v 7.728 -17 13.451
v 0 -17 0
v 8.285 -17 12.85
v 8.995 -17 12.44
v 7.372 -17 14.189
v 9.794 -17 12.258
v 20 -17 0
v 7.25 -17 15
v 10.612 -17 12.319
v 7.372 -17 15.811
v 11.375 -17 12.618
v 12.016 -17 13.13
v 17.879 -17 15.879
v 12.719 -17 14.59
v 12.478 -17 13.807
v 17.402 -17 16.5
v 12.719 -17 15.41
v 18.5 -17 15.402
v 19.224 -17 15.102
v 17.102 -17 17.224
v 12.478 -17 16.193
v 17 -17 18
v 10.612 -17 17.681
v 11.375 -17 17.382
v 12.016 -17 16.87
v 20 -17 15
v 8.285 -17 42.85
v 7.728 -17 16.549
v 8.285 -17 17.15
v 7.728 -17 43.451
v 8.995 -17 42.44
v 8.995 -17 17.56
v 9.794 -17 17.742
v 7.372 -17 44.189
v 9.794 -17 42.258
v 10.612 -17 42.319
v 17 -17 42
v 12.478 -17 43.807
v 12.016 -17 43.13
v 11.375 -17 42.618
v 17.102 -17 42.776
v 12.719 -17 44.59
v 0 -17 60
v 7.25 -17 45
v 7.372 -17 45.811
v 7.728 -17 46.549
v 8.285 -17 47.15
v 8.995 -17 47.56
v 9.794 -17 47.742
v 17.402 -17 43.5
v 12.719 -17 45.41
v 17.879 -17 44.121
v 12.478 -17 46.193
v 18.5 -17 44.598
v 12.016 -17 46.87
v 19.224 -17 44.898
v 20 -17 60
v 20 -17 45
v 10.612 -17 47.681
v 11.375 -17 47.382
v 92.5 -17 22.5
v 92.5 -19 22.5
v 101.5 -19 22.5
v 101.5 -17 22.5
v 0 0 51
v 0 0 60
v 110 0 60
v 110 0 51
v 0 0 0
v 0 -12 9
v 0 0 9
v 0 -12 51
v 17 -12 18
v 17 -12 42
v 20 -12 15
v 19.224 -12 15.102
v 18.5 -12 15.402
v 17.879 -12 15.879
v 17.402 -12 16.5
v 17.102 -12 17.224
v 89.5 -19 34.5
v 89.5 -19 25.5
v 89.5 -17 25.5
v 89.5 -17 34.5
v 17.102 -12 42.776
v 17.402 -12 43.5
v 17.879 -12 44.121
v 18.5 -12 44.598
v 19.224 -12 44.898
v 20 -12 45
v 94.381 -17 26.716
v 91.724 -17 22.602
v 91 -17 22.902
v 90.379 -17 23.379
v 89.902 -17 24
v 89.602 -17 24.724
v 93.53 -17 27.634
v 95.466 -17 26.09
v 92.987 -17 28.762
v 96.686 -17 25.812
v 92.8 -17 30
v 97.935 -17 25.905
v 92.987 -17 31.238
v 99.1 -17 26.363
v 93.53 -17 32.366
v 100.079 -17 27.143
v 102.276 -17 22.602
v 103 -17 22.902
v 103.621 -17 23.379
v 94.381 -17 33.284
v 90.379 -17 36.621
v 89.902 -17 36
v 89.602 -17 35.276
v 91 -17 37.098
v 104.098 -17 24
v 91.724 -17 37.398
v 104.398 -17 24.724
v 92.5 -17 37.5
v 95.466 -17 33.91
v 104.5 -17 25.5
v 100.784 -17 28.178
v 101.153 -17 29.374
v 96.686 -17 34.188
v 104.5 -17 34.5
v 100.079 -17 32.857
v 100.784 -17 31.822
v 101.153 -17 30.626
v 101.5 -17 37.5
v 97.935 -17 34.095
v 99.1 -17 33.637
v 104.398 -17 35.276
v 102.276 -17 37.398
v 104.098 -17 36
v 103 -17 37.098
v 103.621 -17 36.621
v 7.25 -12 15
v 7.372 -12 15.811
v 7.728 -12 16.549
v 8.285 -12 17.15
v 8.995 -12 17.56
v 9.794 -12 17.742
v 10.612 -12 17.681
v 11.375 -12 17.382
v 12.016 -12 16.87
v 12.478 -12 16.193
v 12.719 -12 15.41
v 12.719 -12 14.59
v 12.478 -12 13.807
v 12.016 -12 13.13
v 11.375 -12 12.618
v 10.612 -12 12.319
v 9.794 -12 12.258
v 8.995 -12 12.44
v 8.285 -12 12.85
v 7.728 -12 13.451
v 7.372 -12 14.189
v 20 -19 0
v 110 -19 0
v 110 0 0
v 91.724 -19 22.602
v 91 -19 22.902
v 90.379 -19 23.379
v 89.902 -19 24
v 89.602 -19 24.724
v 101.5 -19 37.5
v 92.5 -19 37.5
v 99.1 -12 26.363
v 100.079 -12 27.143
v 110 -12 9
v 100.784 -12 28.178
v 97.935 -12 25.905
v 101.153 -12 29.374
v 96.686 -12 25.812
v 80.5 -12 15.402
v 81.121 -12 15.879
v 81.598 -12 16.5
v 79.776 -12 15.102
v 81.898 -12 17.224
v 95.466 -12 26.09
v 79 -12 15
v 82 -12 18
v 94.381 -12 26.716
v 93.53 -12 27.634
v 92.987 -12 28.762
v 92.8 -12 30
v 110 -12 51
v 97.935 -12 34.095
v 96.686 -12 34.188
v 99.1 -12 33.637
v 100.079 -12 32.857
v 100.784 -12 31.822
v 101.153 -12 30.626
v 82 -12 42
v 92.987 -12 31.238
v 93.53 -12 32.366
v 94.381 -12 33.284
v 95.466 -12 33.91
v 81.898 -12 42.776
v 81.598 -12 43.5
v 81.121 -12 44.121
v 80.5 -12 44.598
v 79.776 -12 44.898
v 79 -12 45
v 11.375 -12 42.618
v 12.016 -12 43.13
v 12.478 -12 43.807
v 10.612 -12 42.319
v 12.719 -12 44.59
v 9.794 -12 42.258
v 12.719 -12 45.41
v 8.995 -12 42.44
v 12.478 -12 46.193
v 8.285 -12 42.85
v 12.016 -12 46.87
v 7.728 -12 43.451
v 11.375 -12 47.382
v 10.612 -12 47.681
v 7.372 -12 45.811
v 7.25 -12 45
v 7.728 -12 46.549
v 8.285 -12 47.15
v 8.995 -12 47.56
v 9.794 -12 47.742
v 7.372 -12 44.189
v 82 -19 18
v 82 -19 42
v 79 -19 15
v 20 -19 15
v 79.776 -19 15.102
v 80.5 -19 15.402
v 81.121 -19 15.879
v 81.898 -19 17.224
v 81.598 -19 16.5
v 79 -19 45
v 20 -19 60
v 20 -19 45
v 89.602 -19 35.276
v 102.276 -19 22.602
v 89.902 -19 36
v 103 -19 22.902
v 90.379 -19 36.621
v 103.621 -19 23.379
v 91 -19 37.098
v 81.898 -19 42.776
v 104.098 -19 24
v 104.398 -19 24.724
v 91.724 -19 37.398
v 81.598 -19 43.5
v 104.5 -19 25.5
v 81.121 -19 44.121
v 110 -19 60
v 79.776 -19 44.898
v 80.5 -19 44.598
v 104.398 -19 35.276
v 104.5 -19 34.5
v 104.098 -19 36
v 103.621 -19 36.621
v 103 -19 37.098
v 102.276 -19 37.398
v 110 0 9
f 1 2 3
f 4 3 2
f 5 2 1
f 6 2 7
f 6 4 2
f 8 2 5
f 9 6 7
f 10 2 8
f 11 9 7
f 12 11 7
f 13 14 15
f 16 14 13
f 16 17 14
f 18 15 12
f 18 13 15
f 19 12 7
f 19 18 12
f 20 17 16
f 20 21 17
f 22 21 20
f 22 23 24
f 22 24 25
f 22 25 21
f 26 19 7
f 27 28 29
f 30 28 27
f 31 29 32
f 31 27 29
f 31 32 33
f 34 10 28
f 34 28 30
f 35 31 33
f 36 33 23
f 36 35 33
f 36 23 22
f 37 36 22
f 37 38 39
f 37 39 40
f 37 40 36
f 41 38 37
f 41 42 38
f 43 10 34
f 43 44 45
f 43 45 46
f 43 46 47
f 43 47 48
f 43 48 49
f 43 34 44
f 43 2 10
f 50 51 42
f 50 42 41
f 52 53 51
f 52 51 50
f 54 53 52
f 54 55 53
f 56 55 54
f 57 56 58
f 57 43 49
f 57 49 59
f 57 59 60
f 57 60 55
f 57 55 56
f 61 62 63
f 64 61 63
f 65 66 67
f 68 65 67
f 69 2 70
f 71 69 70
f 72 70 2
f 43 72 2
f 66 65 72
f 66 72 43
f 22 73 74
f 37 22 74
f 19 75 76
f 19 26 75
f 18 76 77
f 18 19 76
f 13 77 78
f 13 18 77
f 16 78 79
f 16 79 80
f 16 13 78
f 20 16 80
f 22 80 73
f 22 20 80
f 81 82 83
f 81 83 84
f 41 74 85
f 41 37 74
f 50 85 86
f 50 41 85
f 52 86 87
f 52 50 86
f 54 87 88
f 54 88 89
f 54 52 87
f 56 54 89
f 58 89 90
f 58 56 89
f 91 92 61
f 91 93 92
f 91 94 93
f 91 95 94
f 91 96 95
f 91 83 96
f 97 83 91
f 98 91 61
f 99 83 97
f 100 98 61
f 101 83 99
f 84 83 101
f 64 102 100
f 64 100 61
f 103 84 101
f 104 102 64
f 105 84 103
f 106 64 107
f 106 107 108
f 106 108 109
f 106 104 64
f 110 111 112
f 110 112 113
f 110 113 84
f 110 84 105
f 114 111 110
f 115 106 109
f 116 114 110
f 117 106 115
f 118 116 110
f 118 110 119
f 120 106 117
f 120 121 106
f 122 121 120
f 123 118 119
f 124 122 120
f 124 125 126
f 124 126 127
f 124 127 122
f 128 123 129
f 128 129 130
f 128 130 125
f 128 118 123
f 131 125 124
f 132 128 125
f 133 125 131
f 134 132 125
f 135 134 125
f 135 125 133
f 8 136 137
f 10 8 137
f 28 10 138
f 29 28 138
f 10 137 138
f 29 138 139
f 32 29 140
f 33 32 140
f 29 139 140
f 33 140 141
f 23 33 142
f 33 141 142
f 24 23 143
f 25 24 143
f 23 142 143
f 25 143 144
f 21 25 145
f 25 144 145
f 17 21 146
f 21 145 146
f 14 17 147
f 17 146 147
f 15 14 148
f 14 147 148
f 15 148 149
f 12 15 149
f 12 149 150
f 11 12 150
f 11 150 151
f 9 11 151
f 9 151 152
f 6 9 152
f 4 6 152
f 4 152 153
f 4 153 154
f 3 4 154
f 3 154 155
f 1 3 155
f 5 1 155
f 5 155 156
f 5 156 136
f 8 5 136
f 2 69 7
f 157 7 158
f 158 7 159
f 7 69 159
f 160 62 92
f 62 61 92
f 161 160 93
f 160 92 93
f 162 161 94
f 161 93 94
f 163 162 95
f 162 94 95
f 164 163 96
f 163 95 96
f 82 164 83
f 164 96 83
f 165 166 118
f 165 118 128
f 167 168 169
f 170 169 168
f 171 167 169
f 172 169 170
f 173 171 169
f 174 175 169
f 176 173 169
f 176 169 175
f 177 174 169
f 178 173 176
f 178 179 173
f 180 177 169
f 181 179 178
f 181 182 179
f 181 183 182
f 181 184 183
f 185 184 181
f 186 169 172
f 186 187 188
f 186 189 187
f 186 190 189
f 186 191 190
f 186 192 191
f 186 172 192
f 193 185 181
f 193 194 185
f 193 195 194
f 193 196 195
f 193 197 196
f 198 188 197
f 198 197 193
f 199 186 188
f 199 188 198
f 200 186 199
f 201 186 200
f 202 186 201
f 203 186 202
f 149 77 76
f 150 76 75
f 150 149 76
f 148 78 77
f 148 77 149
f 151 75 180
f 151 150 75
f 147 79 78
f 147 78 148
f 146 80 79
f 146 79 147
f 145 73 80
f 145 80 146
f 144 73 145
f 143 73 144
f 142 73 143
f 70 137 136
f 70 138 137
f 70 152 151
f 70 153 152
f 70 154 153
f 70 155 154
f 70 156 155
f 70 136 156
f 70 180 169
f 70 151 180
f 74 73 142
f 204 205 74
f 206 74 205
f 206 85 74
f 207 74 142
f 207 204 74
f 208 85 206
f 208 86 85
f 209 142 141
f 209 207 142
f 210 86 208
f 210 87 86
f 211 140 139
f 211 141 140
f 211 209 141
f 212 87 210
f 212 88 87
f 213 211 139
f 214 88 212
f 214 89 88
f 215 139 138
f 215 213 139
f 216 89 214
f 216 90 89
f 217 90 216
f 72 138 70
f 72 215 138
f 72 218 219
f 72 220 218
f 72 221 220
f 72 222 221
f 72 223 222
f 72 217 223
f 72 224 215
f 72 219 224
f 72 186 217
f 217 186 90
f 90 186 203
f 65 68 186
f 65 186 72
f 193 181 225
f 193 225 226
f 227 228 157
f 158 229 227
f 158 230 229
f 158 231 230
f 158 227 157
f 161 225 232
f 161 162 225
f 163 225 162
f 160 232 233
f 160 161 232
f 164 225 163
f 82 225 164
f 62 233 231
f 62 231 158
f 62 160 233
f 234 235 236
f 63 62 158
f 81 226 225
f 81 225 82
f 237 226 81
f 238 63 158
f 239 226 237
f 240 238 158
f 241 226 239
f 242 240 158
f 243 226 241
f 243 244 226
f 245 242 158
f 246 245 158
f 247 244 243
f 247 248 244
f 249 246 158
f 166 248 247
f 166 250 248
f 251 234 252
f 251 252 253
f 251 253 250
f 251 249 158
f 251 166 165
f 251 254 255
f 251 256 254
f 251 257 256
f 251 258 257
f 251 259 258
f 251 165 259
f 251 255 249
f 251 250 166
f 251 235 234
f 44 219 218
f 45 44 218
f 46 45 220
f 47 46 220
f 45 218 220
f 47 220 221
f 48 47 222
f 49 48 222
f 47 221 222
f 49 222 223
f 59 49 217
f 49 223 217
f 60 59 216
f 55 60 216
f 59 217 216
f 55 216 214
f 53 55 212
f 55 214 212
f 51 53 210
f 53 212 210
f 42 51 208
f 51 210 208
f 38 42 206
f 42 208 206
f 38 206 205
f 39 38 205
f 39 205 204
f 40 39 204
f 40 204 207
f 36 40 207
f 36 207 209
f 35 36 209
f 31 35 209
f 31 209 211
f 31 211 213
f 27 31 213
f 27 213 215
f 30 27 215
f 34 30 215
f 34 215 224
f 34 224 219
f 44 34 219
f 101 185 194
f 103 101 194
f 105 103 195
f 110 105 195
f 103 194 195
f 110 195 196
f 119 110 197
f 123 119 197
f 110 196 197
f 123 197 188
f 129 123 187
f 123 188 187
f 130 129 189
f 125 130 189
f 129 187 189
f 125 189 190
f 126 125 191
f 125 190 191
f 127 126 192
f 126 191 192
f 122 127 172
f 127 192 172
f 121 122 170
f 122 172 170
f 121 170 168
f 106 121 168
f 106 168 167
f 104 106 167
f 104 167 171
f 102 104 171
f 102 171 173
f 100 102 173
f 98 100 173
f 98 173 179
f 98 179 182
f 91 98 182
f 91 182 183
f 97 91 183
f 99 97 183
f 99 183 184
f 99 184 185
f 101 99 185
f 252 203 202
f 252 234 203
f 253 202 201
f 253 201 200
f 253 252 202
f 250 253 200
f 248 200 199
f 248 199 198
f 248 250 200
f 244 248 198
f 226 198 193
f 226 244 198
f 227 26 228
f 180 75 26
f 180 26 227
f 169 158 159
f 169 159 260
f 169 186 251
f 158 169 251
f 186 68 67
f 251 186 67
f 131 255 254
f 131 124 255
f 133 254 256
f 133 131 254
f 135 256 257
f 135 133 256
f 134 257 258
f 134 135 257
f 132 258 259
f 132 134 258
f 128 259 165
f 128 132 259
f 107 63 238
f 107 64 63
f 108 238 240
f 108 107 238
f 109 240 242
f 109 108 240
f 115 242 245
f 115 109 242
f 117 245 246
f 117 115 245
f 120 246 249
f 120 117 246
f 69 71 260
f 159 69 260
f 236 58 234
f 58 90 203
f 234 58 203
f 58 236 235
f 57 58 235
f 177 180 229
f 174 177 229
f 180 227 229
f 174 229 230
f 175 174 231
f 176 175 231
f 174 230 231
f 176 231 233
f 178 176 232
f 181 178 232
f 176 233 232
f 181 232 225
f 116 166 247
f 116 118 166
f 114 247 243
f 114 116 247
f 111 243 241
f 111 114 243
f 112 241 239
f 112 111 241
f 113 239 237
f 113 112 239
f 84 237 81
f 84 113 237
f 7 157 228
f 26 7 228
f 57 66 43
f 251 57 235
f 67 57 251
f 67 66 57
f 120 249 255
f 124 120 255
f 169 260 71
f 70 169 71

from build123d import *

# Parameters (mm, degrees)
F0_W     = 110
F0_H     = 60
F0_W_2   = 65
F0_H_2   = 30
F1_DEPTH = 19
F2_W     = 110
F2_H     = 42
F2_W_2   = 65
F2_H_2   = 30
F3_DEPTH = 12
F4_W     = 15
F4_H     = 15
F5_DEPTH = 2
F6_R     = 3
F8_D     = 5.5
F8_DEPTH = 50
F9_D     = 8.4
F9_DEPTH = 50


with BuildPart() as f1:
    # F0 (on Front) → F1 (new body)
    with BuildSketch(Plane.XZ):
        with Locations((55, 30)):
            Rectangle(F0_W, F0_H)
        with Locations((49.5, 30)):
            Rectangle(F0_W_2, F0_H_2, mode=Mode.SUBTRACT)
    extrude(amount=F1_DEPTH)

    # F2 (on face) → F3 (cut)
    with BuildSketch(Plane(origin=(0, 0, 0), x_dir=(-1, 0, 0), z_dir=(0, 1, 0))):
        with Locations((-55, 30)):
            Rectangle(F2_W, F2_H)
        with Locations((-49.5, 30)):
            Rectangle(F2_W_2, F2_H_2, mode=Mode.SUBTRACT)
    extrude(amount=-F3_DEPTH, mode=Mode.SUBTRACT)

    # F4 (on face) → F5 (cut)
    with BuildSketch(Plane.XZ.offset(19)):
        Polygon((20, 60), (0, 60), (0, 0), (20, 0), (20, 15), (17, 15), (17, 45), (20, 45), align=None)
        with Locations((97, 30)):
            Rectangle(F4_W, F4_H)
    extrude(amount=-F5_DEPTH, mode=Mode.SUBTRACT)

    # F6
    f6_edges = [f1.edges().sort_by_distance(p)[0] for p in [
        (17, -14.5, 45),
        (17, -14.5, 15),
        (82, -15.5, 45),
        (82, -15.5, 15),
        (89.5, -18, 37.5),
        (104.5, -18, 37.5),
        (104.5, -18, 22.5),
        (89.5, -18, 22.5),
    ]]
    fillet(f6_edges, radius=F6_R)

    # F8
    with Locations(Plane.XZ.offset(17)):
        with Locations((10, 45), (10, 15)):
            Hole(F8_D / 2, depth=F8_DEPTH)

    # F9
    with Locations(Plane.XZ.offset(17)):
        with Locations((97, 30)):
            Hole(F9_D / 2, depth=F9_DEPTH)


solid = f1.part
